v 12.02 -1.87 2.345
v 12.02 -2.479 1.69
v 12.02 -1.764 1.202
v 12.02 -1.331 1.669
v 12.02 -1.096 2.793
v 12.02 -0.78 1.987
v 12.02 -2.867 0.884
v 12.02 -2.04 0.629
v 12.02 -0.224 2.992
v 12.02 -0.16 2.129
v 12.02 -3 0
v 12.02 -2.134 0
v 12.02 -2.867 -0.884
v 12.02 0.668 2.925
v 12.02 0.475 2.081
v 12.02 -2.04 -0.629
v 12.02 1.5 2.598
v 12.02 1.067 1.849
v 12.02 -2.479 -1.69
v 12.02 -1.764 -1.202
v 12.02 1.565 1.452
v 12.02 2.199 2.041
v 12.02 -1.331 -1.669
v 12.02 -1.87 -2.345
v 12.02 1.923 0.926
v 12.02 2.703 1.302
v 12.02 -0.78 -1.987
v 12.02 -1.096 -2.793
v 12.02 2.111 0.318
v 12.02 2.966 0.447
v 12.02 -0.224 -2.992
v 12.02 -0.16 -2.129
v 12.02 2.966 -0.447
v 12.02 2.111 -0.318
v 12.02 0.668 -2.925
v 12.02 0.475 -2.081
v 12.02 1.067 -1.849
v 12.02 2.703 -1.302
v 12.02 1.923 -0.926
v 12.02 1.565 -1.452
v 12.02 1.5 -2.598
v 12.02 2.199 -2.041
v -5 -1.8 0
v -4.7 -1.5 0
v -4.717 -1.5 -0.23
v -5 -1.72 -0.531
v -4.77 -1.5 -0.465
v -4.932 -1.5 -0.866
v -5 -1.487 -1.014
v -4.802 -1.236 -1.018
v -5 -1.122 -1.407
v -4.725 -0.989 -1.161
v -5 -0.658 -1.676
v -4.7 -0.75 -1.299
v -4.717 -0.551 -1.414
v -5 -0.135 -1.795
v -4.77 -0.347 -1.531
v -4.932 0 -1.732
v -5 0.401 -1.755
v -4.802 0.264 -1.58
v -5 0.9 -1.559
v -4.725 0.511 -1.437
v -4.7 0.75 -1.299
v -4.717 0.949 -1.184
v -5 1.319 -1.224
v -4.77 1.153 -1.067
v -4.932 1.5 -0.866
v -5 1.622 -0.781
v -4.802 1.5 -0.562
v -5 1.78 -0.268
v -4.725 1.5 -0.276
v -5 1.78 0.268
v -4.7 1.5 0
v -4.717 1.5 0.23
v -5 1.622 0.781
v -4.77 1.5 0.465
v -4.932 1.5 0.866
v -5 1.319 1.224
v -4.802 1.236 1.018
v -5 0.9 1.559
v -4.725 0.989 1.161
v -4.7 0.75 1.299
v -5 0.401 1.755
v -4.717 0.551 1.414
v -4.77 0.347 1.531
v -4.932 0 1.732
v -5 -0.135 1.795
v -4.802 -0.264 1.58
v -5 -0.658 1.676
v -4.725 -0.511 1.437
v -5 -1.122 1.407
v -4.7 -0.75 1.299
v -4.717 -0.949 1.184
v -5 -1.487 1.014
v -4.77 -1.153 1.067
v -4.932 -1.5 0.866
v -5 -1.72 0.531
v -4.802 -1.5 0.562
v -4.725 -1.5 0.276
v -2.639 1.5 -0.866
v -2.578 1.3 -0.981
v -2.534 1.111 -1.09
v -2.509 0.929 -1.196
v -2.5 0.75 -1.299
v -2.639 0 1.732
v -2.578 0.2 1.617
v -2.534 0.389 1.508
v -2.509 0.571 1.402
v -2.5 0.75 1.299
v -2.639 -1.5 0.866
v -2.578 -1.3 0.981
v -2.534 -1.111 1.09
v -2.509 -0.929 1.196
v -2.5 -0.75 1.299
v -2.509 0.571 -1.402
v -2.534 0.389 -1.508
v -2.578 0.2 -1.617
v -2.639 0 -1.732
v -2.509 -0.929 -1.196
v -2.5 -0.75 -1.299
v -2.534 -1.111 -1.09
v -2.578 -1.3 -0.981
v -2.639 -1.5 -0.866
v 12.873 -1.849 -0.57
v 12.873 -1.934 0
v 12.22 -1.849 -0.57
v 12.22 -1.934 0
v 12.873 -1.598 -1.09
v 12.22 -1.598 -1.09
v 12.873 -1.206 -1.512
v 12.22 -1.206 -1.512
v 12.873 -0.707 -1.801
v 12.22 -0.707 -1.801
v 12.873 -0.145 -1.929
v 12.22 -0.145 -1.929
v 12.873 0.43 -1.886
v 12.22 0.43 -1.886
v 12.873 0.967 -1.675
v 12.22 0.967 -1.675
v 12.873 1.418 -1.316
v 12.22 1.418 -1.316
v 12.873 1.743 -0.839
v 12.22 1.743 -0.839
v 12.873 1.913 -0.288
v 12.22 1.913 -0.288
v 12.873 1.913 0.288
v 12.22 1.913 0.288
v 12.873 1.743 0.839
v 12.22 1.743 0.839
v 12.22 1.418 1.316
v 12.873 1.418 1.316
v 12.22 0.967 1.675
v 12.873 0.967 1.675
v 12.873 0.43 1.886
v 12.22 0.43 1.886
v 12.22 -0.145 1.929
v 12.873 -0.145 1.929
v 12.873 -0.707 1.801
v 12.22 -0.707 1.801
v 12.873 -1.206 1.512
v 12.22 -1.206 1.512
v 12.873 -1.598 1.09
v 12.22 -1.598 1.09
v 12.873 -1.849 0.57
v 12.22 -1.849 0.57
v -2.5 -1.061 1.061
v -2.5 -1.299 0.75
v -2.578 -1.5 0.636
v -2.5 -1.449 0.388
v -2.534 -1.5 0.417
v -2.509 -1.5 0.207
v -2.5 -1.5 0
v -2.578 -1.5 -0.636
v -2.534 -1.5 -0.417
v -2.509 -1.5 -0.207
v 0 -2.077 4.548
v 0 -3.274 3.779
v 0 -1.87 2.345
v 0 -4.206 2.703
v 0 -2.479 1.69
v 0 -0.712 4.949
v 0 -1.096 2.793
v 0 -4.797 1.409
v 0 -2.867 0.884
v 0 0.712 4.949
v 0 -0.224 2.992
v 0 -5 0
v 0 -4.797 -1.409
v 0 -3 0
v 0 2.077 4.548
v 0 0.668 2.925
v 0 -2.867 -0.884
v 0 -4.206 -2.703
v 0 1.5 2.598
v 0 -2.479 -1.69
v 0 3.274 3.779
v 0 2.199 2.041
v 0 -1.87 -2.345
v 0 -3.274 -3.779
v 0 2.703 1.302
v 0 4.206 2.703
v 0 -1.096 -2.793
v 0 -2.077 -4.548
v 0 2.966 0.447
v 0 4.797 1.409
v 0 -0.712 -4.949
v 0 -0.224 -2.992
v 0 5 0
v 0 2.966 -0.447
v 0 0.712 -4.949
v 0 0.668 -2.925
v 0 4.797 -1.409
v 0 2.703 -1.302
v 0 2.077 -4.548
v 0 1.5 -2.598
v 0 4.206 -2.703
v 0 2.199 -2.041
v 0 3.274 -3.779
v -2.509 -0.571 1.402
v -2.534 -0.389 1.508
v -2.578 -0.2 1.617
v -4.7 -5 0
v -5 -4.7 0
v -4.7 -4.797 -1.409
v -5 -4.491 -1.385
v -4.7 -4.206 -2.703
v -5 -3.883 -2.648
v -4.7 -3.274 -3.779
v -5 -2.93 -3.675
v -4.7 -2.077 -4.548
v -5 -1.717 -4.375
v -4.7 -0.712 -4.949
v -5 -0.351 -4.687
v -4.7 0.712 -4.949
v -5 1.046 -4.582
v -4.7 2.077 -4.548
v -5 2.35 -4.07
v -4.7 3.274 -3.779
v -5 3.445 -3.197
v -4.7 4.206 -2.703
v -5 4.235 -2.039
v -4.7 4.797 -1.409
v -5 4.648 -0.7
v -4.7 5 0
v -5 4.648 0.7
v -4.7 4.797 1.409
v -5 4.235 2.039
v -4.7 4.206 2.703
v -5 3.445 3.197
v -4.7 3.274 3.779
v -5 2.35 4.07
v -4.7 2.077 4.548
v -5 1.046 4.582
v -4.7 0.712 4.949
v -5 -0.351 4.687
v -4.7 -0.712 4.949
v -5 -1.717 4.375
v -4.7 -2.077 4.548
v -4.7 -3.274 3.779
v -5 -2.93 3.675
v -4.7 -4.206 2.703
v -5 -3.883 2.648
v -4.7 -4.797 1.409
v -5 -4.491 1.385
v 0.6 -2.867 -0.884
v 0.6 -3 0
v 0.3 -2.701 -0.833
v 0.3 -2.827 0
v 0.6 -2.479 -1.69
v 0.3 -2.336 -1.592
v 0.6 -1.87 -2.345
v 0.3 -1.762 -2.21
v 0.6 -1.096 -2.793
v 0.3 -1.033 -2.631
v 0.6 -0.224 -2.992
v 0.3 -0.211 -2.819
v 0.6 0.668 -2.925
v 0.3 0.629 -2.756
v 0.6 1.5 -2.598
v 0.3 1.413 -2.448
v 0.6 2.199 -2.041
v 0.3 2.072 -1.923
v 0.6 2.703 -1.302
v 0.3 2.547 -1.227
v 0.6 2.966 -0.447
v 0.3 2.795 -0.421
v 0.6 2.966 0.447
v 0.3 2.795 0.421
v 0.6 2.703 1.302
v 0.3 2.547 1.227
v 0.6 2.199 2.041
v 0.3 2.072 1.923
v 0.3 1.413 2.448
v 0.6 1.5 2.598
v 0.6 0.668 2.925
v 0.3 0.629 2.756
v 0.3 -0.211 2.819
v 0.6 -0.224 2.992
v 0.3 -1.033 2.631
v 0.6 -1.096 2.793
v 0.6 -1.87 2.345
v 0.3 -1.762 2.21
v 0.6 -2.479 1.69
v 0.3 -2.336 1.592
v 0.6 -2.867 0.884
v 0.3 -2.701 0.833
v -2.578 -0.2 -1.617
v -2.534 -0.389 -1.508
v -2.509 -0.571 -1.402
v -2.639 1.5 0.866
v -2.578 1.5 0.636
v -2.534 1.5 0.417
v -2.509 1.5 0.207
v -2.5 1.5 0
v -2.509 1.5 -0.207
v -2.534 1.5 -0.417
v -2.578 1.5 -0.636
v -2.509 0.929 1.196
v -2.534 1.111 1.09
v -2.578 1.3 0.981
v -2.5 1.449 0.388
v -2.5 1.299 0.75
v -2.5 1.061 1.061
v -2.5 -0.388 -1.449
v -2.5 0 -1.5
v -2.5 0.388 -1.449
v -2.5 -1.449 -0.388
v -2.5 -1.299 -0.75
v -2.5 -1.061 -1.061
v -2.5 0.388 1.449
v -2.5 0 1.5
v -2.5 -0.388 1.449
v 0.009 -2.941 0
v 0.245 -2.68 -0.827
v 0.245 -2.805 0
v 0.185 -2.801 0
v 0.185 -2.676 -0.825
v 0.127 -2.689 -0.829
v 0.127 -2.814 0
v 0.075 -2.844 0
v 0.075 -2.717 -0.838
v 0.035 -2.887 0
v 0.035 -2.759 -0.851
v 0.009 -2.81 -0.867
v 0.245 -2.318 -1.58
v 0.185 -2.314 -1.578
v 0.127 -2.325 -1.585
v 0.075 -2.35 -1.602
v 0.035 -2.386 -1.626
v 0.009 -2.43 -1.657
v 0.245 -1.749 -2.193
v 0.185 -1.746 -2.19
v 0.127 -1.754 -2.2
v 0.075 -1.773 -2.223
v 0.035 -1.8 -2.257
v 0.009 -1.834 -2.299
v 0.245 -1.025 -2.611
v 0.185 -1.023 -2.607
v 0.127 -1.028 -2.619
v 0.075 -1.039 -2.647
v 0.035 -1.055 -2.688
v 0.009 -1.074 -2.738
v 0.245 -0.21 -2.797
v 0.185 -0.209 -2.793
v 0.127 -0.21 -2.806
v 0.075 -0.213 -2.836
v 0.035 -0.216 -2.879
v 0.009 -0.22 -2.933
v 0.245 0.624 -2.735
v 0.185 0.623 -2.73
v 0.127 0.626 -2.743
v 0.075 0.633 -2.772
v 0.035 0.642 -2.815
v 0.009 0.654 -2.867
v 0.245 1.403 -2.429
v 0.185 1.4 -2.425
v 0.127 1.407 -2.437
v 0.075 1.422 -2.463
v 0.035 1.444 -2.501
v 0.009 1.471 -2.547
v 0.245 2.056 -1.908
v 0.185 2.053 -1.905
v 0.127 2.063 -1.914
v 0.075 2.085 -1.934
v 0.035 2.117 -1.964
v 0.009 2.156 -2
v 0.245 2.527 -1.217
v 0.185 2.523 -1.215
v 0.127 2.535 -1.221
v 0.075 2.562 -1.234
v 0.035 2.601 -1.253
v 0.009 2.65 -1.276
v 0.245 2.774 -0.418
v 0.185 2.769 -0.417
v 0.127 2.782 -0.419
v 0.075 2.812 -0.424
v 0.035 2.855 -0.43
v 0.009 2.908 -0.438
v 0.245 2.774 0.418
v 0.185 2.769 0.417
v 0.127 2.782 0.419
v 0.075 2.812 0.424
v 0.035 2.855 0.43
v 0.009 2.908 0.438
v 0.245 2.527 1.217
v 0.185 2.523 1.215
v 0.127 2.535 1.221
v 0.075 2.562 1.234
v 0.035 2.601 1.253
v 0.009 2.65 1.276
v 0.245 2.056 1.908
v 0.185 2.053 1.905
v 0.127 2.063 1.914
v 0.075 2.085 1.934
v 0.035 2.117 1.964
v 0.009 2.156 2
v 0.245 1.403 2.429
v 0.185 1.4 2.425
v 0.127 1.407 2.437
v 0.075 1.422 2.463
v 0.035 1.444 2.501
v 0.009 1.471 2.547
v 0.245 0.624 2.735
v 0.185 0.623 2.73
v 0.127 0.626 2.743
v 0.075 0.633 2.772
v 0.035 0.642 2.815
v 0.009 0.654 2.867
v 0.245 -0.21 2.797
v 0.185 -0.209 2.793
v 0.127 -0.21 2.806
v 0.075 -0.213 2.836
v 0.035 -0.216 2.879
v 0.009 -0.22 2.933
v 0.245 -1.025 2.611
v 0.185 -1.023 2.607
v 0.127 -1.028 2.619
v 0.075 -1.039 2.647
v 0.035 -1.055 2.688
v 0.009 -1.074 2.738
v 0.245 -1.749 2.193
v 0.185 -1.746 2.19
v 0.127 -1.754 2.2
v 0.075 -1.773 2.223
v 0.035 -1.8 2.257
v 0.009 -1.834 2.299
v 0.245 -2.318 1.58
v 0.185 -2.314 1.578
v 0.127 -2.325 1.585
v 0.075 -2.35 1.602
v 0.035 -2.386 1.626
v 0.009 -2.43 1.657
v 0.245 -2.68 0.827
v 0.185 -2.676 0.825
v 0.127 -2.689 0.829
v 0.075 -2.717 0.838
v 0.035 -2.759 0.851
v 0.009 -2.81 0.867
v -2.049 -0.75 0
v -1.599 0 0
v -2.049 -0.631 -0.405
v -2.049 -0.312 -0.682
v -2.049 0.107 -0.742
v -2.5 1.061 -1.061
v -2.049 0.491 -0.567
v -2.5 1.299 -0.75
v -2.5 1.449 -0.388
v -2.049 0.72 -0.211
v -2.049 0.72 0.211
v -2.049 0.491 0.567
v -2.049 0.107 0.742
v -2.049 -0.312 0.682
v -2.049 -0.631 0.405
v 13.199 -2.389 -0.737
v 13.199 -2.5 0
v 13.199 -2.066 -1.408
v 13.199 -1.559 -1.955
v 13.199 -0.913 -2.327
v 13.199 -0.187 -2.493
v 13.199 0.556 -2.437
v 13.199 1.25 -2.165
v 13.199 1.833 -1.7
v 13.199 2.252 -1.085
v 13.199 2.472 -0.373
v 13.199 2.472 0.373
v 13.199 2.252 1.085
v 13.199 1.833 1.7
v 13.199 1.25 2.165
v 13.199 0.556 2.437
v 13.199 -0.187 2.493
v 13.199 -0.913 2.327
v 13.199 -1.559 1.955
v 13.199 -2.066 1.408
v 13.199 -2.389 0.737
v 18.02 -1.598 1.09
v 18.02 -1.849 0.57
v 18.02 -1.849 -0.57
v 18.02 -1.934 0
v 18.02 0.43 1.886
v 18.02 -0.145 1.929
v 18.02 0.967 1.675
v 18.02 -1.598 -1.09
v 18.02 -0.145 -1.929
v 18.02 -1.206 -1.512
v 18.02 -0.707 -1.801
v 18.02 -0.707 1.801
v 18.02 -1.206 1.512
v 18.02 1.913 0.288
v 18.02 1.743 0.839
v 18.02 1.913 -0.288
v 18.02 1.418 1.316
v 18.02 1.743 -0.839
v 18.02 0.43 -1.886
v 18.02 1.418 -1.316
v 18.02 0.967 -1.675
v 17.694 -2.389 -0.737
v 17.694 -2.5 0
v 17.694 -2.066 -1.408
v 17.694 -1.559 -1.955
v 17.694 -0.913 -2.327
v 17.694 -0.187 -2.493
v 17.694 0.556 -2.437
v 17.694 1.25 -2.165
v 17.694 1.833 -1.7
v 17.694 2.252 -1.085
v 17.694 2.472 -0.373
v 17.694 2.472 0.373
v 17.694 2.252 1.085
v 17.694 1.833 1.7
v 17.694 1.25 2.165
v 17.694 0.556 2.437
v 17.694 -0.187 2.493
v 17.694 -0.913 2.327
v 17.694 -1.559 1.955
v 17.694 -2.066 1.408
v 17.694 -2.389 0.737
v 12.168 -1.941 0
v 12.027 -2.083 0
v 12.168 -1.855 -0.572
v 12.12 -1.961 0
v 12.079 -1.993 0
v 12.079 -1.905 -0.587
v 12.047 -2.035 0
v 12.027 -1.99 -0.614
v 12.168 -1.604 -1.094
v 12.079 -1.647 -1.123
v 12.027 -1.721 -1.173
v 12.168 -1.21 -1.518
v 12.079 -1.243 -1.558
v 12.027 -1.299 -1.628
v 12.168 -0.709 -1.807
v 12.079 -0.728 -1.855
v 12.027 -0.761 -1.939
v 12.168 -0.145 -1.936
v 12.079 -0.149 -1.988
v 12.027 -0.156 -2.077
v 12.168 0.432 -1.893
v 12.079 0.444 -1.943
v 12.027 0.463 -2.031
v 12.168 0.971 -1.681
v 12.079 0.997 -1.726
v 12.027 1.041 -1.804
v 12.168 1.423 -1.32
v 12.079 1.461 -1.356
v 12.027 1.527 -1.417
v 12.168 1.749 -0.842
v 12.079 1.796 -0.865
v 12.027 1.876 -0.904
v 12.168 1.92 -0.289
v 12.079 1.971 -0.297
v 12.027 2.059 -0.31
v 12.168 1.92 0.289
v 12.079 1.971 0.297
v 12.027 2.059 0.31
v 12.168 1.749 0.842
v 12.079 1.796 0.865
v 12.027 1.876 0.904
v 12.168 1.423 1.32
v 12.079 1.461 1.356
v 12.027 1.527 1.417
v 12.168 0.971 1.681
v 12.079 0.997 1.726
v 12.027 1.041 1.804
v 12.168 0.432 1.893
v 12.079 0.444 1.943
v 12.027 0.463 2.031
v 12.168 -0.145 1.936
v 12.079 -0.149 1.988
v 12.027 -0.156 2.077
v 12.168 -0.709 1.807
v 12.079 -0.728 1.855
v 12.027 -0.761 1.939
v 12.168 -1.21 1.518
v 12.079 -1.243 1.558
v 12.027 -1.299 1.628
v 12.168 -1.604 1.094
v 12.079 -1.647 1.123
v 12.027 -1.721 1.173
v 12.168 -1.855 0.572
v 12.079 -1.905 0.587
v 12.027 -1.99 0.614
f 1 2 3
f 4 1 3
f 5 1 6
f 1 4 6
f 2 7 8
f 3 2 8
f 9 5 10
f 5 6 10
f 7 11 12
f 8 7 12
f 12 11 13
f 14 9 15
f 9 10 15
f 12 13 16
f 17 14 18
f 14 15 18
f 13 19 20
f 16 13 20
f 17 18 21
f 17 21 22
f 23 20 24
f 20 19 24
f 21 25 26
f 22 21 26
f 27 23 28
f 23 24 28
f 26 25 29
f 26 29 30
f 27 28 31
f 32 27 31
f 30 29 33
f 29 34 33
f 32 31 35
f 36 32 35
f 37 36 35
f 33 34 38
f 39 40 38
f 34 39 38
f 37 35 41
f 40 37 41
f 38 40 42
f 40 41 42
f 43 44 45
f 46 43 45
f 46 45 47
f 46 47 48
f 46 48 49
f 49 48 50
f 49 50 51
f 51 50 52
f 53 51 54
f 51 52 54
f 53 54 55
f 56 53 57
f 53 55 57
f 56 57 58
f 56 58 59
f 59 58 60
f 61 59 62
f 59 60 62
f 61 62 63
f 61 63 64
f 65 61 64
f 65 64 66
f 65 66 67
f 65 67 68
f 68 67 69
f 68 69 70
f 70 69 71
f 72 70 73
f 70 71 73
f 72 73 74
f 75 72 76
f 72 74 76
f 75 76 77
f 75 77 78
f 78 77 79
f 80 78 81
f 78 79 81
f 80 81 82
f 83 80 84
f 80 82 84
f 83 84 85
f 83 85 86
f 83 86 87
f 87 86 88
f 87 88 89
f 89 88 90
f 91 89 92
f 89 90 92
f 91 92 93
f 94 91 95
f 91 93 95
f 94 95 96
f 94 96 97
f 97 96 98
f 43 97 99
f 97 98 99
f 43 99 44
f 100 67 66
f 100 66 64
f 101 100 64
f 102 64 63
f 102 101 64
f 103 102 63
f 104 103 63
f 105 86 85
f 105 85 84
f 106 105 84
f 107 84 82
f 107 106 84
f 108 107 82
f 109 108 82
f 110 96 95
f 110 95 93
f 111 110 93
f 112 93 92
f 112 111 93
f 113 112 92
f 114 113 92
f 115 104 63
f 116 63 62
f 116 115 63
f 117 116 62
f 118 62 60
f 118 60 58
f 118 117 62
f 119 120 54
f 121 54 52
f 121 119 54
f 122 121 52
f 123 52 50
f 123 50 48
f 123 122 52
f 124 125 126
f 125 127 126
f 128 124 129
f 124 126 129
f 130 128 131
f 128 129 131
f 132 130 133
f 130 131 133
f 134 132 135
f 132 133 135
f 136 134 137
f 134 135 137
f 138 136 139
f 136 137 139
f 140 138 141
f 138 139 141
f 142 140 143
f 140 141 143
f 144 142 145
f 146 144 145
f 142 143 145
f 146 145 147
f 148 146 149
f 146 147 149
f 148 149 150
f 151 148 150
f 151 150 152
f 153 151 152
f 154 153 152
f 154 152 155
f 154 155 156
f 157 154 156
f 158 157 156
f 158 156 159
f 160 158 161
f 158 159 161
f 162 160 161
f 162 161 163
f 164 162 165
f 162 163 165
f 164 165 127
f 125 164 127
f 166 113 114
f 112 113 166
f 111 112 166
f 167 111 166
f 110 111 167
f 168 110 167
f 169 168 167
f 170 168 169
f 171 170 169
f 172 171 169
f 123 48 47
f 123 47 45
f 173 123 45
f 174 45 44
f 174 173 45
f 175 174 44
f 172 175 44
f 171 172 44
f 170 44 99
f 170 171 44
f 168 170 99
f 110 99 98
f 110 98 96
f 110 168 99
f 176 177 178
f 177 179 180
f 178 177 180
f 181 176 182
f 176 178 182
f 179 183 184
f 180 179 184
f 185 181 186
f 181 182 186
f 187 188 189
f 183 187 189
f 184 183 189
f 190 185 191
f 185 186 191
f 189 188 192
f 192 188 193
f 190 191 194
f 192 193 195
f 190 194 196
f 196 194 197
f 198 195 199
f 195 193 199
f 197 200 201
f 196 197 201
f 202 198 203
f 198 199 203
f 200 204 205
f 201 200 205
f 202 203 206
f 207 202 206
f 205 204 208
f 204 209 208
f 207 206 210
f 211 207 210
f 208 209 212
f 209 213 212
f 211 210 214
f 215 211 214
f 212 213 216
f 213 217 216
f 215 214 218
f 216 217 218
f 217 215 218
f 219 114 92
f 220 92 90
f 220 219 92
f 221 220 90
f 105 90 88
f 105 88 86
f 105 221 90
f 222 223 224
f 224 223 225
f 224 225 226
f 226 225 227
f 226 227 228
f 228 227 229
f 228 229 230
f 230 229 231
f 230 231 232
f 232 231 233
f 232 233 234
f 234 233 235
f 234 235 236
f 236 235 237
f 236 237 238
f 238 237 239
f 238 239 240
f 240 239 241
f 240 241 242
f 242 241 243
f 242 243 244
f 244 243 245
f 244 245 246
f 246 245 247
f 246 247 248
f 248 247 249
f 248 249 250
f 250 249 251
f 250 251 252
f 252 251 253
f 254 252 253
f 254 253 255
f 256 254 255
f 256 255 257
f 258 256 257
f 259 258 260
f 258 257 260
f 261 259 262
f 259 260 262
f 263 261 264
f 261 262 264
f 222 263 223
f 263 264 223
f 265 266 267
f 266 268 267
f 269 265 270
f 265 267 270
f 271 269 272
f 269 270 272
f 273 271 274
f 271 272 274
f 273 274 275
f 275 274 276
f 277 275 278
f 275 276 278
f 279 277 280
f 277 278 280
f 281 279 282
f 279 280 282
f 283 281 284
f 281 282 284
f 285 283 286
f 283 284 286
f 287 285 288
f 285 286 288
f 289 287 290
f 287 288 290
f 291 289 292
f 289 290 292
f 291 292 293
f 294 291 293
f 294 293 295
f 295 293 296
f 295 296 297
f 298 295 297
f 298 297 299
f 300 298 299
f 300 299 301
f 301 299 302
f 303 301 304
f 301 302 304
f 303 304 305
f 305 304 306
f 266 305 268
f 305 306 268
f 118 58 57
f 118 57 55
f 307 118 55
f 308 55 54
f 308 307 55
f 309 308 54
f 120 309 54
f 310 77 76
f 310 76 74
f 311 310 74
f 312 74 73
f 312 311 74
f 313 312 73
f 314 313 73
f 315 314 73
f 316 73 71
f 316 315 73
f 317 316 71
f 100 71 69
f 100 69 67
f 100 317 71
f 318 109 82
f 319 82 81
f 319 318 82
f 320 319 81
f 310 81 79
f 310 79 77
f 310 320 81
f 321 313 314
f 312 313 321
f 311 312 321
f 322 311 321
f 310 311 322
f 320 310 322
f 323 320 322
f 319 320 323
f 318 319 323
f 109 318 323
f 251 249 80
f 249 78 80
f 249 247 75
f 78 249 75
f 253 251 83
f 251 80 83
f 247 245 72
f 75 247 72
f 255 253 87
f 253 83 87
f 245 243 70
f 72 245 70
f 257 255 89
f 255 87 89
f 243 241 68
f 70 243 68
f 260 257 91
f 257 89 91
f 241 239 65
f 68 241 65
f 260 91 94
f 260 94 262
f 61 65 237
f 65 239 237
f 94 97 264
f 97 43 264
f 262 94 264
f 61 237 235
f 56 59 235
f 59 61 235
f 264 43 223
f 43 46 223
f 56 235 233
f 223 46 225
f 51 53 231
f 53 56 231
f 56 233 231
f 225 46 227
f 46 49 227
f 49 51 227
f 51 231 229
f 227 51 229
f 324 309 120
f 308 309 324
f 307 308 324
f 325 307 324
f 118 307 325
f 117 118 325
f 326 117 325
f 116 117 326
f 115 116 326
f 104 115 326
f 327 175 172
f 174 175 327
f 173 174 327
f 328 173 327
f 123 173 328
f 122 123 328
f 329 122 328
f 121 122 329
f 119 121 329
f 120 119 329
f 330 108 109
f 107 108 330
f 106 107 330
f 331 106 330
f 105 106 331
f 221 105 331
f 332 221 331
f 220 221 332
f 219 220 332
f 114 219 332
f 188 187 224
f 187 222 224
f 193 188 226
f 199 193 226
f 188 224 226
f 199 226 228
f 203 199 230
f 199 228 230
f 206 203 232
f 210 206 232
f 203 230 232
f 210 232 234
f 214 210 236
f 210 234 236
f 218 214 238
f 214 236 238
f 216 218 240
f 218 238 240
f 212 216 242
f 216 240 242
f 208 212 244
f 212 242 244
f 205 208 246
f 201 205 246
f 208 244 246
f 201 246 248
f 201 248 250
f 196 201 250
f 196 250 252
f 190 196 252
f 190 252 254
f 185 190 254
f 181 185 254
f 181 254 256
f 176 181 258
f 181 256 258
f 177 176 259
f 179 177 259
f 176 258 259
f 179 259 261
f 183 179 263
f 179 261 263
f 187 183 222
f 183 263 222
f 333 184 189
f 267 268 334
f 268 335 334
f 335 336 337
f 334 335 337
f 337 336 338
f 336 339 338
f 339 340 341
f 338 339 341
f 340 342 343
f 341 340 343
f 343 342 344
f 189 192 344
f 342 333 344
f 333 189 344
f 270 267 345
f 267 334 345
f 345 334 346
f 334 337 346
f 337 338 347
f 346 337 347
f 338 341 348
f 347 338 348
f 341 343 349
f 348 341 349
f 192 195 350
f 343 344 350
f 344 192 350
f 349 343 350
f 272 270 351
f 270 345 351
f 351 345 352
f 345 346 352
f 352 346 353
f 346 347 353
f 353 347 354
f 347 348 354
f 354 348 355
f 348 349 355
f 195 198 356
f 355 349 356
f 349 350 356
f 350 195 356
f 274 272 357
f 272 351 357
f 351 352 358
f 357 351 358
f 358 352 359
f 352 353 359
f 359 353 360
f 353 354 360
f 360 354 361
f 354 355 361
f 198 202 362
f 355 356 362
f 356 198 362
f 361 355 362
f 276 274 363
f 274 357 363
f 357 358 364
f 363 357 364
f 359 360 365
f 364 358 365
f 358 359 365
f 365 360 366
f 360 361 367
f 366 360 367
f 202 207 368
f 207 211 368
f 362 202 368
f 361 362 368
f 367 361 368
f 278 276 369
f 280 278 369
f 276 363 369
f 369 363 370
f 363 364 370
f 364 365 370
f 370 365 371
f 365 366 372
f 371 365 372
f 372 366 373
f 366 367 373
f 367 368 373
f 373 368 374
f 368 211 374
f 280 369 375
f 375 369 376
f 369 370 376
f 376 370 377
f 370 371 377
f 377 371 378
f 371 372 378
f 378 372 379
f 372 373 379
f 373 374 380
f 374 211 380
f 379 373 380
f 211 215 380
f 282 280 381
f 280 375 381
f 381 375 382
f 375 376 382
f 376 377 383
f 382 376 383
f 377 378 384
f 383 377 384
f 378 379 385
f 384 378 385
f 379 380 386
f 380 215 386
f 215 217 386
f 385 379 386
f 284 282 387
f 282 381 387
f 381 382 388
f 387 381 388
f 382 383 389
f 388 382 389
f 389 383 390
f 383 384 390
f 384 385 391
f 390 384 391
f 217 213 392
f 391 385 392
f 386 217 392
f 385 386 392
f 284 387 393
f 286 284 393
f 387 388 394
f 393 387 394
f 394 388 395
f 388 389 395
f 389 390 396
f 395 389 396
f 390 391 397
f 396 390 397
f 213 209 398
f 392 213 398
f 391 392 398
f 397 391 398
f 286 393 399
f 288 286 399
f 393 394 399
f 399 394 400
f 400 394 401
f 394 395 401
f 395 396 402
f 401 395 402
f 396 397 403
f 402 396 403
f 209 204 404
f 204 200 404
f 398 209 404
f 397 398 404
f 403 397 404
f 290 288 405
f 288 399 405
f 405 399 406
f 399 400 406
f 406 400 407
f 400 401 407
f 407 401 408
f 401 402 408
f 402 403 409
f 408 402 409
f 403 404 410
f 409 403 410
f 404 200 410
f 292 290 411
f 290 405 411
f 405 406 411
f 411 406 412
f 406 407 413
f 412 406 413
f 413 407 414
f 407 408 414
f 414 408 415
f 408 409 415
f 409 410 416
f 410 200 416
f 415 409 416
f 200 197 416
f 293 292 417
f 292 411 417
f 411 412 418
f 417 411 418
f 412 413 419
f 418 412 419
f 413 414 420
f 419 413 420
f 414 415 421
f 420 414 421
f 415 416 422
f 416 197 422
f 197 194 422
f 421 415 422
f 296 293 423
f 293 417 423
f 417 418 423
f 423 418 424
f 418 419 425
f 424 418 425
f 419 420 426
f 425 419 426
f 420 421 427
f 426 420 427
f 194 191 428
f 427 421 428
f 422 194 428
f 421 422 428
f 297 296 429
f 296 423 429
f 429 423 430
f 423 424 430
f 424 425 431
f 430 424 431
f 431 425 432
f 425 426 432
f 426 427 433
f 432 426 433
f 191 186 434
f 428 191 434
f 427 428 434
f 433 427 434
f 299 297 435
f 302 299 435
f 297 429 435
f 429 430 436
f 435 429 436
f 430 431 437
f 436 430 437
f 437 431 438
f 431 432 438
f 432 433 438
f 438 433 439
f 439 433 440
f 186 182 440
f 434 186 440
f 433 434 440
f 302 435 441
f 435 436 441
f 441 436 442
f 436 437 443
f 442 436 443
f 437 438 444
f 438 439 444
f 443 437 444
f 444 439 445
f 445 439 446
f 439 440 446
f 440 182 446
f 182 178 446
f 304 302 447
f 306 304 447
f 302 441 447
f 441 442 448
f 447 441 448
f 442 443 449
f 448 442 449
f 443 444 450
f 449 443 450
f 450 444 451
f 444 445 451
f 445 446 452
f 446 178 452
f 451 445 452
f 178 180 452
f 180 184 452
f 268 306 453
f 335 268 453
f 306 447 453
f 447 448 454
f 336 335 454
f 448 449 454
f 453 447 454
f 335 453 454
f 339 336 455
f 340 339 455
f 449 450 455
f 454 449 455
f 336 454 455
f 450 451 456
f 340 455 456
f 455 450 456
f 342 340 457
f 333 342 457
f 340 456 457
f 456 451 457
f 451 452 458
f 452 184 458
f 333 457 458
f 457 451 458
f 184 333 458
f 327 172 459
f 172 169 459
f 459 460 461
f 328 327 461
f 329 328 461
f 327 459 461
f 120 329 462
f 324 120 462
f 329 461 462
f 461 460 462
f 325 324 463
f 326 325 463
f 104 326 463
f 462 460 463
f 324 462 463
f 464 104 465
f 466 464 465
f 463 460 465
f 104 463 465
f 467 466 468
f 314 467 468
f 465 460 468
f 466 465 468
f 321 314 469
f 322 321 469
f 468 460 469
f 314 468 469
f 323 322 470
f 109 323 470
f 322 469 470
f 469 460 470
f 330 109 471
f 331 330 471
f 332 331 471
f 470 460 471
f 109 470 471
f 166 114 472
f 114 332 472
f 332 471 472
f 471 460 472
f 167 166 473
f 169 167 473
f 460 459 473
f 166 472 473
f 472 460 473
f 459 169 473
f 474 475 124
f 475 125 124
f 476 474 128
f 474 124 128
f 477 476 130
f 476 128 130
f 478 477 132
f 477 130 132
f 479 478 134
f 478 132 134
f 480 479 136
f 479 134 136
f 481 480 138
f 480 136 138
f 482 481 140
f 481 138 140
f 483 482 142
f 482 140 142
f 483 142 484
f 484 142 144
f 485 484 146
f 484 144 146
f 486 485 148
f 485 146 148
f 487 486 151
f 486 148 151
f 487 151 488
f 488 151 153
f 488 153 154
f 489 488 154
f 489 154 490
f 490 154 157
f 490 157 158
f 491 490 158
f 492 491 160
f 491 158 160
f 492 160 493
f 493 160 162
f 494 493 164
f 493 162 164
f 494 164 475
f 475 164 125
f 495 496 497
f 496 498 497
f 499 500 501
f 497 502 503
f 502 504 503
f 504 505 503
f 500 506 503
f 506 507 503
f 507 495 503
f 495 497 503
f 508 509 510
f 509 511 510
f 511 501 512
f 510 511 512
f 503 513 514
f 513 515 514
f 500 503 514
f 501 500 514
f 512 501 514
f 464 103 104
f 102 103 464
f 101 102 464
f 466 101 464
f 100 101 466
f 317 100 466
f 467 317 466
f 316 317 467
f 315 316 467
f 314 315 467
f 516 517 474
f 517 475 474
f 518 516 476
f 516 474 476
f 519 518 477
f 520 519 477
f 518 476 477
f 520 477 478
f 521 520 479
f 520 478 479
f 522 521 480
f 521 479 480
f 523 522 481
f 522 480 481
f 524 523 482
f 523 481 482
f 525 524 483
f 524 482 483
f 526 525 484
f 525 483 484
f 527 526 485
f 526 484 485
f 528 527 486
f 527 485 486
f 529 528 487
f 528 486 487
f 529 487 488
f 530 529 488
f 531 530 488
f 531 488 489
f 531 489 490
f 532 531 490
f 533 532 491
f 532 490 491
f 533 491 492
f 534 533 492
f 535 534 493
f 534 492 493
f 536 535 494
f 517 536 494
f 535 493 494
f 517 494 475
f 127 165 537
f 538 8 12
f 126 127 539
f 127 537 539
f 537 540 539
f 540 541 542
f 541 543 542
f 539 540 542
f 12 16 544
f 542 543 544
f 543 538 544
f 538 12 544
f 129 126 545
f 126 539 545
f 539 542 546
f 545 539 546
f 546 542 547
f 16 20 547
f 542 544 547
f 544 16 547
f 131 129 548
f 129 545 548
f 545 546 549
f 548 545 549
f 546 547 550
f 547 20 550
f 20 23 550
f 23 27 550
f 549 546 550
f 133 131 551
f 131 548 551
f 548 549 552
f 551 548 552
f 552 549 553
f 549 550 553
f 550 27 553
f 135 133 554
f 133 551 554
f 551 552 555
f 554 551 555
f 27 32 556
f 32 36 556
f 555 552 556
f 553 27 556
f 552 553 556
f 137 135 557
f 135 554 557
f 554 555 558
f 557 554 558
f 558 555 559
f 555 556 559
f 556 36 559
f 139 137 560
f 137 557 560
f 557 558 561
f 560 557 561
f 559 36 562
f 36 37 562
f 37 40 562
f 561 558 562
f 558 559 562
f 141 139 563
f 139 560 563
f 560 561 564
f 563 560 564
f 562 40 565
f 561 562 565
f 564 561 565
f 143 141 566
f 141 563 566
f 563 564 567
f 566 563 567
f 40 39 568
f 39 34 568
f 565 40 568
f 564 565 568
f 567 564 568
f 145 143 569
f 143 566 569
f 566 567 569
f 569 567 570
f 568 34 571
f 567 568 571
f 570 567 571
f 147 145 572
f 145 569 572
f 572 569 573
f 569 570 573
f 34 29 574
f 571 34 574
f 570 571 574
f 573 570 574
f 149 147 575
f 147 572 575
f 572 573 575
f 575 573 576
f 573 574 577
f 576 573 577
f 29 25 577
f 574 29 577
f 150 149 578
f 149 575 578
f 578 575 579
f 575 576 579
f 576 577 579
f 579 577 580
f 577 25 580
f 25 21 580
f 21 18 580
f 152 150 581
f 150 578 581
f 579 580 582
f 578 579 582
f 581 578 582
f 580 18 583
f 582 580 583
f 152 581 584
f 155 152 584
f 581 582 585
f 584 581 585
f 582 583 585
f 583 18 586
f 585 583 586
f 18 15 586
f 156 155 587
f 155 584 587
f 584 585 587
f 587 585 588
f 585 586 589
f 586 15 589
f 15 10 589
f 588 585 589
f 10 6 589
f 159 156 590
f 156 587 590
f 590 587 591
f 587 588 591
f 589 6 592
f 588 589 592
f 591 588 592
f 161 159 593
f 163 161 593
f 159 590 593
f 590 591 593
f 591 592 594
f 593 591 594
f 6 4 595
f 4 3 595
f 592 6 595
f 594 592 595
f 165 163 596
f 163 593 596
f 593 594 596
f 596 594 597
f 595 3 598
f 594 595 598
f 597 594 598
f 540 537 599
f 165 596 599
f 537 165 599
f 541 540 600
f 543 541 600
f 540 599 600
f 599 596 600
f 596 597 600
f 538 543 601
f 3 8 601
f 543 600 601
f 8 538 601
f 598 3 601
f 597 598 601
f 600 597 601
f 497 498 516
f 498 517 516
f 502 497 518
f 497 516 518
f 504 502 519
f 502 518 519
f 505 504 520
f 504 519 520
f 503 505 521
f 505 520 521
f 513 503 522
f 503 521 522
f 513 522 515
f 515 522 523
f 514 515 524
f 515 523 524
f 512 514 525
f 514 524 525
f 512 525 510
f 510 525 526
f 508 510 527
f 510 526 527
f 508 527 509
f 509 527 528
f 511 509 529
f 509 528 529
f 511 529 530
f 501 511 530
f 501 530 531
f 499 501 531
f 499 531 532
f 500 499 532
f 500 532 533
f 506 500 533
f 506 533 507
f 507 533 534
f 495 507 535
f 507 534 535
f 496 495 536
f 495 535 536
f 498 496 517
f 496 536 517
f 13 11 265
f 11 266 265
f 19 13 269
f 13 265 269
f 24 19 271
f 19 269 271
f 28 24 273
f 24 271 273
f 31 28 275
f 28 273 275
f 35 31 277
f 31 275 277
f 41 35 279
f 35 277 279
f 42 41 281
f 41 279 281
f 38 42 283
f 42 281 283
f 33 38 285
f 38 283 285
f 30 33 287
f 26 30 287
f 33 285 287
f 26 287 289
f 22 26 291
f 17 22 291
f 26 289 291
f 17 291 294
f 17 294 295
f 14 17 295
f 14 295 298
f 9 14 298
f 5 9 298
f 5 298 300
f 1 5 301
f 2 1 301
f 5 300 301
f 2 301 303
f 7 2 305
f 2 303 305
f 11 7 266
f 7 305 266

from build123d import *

# Parameters (mm, degrees)
HEXEXTRUDE_REACH = 26.082


with BuildPart() as part:
    # Sketch2 → ScrewRevolve (revolve)
    with BuildSketch(Plane.XY):
        with BuildLine():
            Line((18.02, 1.9345), (17.693508423, 2.5))
            Line((17.693508423, 2.5), (13.199474732, 2.5))
            Line((13.199474732, 2.5), (12.872983154, 1.9345))
            Line((12.872983154, 1.9345), (12.22, 1.9345))
            ThreePointArc((12.22, 1.9345), (12.078578644, 1.993078644), (12.02, 2.1345))
            Line((12.02, 2.1345), (12.02, 3))
            Line((12.02, 3), (0.6, 3))
            Line((0.6, 3), (0.3, 2.826794919))
            ThreePointArc((0.3, 2.826794919), (0.1, 2.826794919), (0, 3))
            Line((0, 3), (0, 5))
            Line((0, 5), (-4.7, 5))
            Line((-4.7, 5), (-5, 4.7))
            Line((-5, 4.7), (-5, 1.8))
            Line((-5, 1.8), (-4.7, 1.5))
            Line((-4.7, 1.5), (-2.5, 1.5))
            Line((-2.5, 1.5), (-1.598709071, 0))
            Line((-1.598709071, 0), (18.02, 0))
            Line((18.02, 0), (18.02, 1.9345))
        make_face()
    revolve(axis=Axis((-1.598709071, 0, 0), (1, 0, 0)))

    # HexExtrude: up to this cone (the profile starts inside it)
    hexextrude_end = Plane(origin=(-5, 0, 0), z_dir=(-1, 0, 0)).offset(-3.401289929) * Cone(1.664e-06, 59.321560618, 35.643988634, align=(Align.CENTER, Align.CENTER, Align.MIN), mode=Mode.PRIVATE)
    # Sketch3 → HexExtrude (cut, up to the surface)
    with BuildSketch(Plane.ZY.offset(5), mode=Mode.PRIVATE) as hexextrude_sk1:
        Polygon((-0.866025404, 1.5), (-1.732050808, 0), (-0.866025404, -1.5), (0.866025404, -1.5), (1.732050808, 0), (0.866025404, 1.5), align=None)
    hexextrude_tool1 = extrude(hexextrude_sk1.sketch, amount=-HEXEXTRUDE_REACH, mode=Mode.PRIVATE) & hexextrude_end
    add(hexextrude_tool1.solids().sort_by_distance((-5, 0, 0))[0], mode=Mode.SUBTRACT)


solid = part.part
